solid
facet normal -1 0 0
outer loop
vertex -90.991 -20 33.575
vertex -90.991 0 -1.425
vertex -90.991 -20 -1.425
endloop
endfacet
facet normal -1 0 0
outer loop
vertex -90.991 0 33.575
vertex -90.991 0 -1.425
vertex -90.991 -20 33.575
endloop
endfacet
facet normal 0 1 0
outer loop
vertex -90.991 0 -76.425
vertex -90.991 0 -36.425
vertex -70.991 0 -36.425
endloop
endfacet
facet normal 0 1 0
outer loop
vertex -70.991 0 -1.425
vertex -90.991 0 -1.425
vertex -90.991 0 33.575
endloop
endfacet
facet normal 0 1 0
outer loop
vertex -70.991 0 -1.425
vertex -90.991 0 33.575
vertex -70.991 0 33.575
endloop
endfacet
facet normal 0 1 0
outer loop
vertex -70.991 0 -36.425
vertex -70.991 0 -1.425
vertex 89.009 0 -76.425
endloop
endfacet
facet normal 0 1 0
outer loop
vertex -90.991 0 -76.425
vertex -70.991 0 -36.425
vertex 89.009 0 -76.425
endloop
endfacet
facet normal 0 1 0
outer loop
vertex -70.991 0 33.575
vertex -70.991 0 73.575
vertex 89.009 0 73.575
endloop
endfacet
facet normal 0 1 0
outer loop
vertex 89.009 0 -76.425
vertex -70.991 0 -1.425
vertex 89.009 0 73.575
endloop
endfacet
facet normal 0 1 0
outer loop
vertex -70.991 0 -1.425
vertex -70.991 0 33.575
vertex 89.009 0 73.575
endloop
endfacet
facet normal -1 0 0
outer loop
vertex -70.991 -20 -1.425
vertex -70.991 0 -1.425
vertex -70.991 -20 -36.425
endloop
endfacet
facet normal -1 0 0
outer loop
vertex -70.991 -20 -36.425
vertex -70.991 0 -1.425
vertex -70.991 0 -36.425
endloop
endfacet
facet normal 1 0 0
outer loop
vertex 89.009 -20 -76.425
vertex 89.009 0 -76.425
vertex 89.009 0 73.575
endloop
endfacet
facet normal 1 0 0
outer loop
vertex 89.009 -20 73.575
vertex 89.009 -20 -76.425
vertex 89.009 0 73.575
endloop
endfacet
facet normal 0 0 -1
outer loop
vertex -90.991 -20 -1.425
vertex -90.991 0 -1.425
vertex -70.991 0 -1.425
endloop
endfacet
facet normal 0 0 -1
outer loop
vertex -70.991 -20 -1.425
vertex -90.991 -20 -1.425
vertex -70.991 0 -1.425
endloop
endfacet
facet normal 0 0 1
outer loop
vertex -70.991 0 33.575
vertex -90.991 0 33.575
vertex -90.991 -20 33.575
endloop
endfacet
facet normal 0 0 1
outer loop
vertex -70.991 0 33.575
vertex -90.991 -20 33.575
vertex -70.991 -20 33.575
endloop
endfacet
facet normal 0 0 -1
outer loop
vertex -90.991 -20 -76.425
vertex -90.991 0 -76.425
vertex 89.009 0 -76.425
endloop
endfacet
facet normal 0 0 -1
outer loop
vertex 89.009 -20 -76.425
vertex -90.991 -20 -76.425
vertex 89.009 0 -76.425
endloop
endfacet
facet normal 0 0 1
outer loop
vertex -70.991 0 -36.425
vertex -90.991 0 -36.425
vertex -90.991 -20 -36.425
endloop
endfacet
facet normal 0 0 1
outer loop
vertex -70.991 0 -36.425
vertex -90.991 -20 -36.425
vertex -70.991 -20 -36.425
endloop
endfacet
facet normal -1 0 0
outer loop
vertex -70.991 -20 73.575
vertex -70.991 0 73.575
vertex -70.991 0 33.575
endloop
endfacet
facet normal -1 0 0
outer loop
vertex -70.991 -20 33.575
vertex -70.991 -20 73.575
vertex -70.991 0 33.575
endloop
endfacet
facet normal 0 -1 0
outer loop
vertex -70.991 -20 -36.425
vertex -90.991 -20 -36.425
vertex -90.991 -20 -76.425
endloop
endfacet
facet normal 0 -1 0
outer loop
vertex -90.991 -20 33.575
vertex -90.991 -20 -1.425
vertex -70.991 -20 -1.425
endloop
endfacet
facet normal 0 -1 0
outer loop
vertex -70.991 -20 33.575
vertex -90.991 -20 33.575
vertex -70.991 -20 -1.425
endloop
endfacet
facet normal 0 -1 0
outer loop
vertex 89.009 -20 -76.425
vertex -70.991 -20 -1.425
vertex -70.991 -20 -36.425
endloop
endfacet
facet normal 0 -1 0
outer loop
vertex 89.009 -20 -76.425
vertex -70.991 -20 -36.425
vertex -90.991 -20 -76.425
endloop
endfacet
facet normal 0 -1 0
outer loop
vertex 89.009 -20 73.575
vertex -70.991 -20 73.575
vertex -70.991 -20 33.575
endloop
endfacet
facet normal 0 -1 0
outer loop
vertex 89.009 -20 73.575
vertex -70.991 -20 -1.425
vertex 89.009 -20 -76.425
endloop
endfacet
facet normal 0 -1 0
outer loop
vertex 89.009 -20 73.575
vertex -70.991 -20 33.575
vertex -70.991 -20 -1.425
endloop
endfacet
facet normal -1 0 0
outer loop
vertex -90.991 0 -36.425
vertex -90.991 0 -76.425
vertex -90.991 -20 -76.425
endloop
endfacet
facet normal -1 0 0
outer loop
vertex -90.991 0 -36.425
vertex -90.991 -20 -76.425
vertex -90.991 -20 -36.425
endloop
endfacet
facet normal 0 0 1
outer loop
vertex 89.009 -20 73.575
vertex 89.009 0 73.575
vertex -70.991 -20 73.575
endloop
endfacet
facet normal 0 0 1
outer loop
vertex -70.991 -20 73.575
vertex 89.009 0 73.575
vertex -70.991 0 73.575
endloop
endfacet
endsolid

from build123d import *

# Parameters (mm, degrees)
F0_W     = 20
F0_H     = 35
F0_H_2   = 40
F1_DEPTH = 20


with BuildPart() as f1:
    # F0 (on Front) → F1 (new body)
    with BuildSketch(Plane.XZ):
        Polygon((89.008551, 73.575356), (-70.991449, 73.575356), (-70.991449, 33.575356), (-70.991449, -1.424644), (-70.991449, -36.424644), (-70.991449, -76.424644), (89.008551, -76.424644), align=None)
        with Locations((-80.991449, 16.075356)):
            Rectangle(F0_W, F0_H)
        with Locations((-80.991449, -56.424644)):
            Rectangle(F0_W, F0_H_2)
    extrude(amount=F1_DEPTH)


solid = f1.part
